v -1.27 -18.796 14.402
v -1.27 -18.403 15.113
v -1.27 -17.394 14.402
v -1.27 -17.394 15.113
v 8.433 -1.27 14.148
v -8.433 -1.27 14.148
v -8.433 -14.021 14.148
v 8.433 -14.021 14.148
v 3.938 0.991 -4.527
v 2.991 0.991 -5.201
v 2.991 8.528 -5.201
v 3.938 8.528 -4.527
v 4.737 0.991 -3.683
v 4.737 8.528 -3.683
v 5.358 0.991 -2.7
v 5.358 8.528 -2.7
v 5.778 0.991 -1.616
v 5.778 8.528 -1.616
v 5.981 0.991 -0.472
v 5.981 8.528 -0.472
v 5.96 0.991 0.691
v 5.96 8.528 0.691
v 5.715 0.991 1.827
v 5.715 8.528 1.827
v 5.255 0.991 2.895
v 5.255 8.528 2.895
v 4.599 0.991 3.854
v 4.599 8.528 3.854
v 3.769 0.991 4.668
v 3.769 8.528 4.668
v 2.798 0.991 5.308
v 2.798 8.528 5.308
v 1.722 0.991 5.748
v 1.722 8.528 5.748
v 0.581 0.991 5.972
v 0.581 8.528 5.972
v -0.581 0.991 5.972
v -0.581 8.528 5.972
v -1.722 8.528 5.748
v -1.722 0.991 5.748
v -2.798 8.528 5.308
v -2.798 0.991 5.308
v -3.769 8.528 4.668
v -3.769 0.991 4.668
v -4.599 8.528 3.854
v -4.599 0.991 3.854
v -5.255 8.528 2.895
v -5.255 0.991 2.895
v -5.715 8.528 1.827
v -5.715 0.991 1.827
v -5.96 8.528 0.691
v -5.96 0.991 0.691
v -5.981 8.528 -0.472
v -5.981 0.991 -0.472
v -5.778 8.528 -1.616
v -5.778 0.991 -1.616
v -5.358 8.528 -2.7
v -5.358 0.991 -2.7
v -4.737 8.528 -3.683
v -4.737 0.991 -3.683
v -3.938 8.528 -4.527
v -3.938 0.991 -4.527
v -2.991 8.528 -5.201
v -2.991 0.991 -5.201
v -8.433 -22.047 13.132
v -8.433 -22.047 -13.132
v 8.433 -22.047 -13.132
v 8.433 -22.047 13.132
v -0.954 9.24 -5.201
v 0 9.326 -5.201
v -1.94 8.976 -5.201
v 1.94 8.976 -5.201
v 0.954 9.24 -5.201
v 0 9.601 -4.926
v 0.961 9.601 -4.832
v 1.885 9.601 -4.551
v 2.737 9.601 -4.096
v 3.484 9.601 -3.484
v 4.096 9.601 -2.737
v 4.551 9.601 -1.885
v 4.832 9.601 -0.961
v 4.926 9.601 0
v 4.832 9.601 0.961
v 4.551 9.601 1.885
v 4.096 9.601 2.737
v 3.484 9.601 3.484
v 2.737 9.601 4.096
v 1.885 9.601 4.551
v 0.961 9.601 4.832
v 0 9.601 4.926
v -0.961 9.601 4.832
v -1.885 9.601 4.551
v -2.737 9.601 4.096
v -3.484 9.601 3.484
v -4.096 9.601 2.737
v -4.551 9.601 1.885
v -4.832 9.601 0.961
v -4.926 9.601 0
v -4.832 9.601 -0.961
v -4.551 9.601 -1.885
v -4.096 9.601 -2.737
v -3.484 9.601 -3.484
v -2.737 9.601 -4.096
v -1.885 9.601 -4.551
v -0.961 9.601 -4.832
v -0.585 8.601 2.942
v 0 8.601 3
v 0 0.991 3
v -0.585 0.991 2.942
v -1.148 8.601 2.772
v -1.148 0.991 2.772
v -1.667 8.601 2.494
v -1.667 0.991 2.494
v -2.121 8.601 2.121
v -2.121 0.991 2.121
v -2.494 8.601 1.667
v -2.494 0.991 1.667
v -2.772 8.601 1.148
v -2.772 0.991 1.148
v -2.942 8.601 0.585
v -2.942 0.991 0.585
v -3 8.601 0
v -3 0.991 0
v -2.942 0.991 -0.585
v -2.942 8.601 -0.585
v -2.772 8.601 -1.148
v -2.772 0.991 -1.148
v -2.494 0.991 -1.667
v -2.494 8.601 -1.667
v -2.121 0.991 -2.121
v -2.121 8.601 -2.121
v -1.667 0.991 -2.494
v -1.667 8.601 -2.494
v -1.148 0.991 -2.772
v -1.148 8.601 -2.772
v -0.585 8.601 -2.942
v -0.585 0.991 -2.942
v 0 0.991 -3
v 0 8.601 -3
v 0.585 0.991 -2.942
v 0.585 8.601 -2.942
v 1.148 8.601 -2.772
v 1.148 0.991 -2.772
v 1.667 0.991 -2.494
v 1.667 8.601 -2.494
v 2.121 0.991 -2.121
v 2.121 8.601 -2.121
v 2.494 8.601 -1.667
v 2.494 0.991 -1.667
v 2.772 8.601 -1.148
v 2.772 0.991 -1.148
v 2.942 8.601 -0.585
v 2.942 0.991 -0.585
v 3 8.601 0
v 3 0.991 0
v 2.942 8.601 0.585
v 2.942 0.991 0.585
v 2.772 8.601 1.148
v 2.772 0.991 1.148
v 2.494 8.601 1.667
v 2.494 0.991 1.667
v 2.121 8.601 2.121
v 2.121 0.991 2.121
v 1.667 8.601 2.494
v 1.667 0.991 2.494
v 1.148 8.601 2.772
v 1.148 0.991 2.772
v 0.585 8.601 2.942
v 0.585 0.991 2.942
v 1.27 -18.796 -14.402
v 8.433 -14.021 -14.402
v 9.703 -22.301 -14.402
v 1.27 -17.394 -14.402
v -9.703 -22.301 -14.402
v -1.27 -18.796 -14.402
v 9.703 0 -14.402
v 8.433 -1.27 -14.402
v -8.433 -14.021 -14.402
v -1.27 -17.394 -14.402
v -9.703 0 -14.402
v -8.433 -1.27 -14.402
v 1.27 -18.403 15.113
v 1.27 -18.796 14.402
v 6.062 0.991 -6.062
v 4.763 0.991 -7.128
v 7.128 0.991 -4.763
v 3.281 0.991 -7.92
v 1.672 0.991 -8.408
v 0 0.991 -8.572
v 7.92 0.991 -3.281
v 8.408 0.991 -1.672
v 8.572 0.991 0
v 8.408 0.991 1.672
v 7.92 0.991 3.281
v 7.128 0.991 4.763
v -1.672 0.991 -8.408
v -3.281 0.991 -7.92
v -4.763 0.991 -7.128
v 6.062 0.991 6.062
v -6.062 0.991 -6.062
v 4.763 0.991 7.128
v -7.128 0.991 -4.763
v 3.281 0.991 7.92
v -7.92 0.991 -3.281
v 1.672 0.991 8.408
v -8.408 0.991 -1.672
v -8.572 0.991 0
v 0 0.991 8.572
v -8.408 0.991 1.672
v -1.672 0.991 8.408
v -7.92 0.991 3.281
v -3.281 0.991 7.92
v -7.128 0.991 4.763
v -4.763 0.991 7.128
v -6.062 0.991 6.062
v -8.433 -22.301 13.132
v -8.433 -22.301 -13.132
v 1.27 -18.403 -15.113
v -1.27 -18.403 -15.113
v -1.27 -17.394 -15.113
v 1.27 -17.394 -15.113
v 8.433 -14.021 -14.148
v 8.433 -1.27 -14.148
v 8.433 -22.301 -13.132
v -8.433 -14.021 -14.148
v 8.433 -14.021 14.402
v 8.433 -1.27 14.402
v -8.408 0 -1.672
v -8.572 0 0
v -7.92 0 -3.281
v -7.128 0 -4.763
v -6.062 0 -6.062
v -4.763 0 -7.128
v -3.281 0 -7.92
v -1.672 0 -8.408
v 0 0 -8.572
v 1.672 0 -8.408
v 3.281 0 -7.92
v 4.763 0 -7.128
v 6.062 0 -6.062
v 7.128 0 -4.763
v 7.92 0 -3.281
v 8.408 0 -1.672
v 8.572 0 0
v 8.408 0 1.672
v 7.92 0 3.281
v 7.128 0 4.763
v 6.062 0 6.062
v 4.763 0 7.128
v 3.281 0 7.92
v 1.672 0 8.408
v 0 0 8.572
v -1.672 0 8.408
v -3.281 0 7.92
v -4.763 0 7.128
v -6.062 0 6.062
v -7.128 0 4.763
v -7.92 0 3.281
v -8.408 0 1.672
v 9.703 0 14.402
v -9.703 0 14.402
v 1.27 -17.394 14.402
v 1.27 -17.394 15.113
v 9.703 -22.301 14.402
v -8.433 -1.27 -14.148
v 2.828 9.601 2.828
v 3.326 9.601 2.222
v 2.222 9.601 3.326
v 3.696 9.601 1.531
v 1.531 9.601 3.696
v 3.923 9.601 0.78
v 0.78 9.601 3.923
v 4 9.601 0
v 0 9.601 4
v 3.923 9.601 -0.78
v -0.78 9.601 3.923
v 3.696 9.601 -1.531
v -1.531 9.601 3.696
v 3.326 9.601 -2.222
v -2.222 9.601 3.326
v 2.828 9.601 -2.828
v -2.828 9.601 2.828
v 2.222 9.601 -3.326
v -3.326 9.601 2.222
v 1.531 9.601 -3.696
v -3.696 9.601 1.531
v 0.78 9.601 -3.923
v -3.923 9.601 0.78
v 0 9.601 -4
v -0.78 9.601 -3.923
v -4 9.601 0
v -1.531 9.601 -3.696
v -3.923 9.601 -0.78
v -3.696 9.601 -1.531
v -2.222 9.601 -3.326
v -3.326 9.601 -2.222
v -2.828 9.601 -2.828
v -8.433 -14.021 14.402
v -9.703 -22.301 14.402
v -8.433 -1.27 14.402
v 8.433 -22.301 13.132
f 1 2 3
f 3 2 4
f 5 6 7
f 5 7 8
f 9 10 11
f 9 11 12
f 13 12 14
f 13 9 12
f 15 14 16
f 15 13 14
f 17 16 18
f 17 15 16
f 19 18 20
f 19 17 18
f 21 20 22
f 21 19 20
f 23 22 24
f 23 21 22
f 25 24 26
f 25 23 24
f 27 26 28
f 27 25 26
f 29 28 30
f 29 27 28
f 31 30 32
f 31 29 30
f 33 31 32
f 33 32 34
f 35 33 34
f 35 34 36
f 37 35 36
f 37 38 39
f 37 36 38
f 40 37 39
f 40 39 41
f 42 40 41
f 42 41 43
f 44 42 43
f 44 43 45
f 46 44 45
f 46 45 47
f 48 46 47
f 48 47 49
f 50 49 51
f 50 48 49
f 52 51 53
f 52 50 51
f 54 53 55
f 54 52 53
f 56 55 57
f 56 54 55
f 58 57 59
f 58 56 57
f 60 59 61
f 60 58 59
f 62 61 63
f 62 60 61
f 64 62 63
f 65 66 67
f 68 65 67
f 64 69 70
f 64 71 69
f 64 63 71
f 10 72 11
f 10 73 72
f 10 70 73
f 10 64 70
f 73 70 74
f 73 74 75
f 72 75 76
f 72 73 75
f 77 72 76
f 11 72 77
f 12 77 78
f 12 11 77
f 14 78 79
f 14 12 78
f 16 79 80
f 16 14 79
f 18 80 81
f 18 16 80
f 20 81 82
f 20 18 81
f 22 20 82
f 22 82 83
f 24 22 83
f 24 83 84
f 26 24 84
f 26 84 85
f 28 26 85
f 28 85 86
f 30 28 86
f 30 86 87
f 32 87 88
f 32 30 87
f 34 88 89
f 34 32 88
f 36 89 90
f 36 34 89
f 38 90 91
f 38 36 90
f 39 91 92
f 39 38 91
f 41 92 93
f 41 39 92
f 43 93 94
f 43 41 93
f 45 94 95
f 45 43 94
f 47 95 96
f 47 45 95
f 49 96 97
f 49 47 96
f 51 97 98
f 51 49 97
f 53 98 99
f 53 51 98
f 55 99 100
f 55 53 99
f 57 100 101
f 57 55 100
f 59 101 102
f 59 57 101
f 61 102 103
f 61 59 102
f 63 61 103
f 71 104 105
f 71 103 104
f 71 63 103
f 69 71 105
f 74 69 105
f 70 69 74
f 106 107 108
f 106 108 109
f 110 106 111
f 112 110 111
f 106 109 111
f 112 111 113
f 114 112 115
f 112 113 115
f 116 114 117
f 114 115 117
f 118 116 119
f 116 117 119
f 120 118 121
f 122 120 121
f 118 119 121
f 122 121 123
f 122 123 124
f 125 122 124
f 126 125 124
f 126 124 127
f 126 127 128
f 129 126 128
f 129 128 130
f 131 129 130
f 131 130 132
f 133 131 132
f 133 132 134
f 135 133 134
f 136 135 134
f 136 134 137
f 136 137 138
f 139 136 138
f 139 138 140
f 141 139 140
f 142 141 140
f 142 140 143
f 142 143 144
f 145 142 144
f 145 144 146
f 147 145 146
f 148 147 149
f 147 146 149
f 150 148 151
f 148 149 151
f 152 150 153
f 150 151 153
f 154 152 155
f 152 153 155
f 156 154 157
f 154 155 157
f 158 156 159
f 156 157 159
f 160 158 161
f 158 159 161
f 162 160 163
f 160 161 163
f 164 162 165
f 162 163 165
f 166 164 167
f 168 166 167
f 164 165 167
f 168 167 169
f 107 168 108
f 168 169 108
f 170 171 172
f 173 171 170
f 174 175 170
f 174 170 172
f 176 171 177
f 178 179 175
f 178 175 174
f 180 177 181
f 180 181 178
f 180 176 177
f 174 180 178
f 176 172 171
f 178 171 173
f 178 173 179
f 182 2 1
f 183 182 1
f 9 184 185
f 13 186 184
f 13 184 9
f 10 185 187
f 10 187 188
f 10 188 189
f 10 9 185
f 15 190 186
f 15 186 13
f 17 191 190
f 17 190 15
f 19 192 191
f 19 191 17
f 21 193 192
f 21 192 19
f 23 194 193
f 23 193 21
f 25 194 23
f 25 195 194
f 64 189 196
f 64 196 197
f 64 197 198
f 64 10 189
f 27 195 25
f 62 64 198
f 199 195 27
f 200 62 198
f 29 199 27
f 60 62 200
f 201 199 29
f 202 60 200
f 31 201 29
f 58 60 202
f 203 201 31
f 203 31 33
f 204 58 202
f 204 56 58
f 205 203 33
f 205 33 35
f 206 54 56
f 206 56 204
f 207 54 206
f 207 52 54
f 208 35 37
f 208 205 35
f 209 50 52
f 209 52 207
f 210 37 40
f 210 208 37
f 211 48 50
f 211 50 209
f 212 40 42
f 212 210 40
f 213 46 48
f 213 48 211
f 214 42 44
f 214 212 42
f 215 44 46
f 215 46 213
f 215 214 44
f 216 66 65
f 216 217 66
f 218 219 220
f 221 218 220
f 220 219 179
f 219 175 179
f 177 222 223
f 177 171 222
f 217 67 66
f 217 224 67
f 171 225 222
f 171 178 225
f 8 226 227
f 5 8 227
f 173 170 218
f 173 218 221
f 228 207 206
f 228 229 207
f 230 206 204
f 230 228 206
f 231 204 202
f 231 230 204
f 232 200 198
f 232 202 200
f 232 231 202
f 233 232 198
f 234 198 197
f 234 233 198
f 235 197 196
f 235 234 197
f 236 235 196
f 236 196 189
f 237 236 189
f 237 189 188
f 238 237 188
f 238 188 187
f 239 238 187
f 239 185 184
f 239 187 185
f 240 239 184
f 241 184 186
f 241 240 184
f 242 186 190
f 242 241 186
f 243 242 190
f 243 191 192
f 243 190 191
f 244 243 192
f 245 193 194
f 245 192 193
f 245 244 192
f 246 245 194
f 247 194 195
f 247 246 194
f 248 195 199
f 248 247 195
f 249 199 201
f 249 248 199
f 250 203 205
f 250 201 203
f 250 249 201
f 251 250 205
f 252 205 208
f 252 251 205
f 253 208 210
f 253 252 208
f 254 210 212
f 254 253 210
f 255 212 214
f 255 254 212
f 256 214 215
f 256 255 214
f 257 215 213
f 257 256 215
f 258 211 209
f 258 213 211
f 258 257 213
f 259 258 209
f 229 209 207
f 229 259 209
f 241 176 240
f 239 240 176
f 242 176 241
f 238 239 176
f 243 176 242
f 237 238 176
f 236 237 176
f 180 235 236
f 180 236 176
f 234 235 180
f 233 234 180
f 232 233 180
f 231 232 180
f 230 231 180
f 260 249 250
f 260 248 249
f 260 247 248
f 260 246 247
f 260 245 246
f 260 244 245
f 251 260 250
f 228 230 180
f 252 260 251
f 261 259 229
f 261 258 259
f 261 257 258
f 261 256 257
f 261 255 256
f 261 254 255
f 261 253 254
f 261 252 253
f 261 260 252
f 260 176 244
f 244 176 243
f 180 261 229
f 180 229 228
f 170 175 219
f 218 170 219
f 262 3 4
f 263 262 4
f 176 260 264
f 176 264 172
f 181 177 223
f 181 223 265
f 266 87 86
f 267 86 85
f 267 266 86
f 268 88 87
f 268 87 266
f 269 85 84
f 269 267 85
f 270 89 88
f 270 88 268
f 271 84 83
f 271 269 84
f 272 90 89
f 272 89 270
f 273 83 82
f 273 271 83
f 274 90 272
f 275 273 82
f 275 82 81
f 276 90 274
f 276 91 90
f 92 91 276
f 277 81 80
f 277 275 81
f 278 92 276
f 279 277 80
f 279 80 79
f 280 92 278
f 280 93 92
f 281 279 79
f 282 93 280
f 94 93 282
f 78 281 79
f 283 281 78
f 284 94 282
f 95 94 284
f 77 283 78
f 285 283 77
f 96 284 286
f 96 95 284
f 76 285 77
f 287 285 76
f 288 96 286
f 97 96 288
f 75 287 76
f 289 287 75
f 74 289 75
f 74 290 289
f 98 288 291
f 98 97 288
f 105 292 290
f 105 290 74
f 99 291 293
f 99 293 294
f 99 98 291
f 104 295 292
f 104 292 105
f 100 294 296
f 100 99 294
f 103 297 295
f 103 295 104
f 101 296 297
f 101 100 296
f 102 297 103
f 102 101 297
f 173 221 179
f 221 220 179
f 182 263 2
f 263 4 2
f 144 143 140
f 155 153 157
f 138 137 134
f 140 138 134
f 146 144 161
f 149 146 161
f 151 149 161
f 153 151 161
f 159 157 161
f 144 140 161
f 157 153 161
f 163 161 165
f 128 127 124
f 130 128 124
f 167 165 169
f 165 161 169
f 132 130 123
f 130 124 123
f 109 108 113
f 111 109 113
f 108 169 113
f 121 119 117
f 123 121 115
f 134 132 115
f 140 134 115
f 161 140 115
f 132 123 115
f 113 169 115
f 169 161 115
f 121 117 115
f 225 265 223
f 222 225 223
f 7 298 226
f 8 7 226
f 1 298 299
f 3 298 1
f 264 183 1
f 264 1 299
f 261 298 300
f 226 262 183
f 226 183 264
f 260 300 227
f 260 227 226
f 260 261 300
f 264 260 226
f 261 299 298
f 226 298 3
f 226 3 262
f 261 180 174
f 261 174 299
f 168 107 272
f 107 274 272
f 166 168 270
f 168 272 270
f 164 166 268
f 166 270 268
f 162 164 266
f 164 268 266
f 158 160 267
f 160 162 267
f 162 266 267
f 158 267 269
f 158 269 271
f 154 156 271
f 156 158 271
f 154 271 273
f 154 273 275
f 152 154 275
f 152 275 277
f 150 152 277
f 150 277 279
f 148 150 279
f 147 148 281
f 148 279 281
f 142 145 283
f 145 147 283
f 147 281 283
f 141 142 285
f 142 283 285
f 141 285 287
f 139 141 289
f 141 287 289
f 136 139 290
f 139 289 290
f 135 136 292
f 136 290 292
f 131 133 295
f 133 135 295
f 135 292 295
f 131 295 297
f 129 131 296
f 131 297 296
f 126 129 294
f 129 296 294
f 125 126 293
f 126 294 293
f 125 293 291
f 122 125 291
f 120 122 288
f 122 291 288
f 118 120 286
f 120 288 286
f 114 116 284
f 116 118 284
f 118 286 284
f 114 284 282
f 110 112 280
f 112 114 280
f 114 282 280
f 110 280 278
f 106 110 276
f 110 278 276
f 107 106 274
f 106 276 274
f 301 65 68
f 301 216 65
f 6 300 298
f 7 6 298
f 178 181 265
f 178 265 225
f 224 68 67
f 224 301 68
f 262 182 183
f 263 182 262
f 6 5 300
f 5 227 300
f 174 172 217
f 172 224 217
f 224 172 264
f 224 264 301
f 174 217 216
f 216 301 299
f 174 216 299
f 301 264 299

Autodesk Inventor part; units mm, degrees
sketch "Sketch_1" plane through (0, 0, 0) normal (0, 1, 0) x (-1, 0, 0)
  line L0 (9.7028, 14.4018) -> (-9.7028, 14.4018)
  line L1 (-9.7028, 14.4018) -> (-9.7028, -14.4018)
  line L2 (-9.7028, -14.4018) -> (9.7028, -14.4018)
  line L3 (9.7028, -14.4018) -> (9.7028, 14.4018)
extrude "Extrusion1" add sketch "Sketch_1" against normal blind 22.3012
sketch "Sketch_2" plane through (0, 0, 0) normal (0, 1, 0) x (-1, 0, 0)
  circle A0 centre (0, 0) radius 8.5725
extrude "Extrusion2" add sketch "Sketch_2" along normal blind 0.9906
sketch "Sketch_3" plane through (0, 0, 0) normal (1, 0, 0) x (0, 1, 0)
  line L0 (0.9906, 0) -> (9.6012, 0)
  line L1 (9.6012, 0) -> (9.6012, -4.9265)
  line L2 (9.6012, -4.9265) -> (8.5277, -6)
  line L3 (8.5277, -6) -> (0.9906, -6)
  line L4 (0.9906, -6) -> (0.9906, 0)
  line L5 (0.9906, 0) -> (9.6012, 0)
revolve "Revolution1" add sketch "Sketch_3" angle 360 about axis through (0, 0.9906, 0) along (0, 1, 0)
sketch "Sketch_10" plane through (0, 0.9906, 0) normal (0, 1, 0) x (1, 0, 0)
  line L0 (-2.9909, 5.2014) -> (2.9909, 5.2014)
  arc A0 (2.9909, 5.2014) -> (-2.9909, 5.2014) centre (0, 0) ccw
extrude "Extrusion3" cut sketch "Sketch_10" along normal blind 8.6106
sketch "Sketch5" plane through (0, 9.6012, 0) normal (0, 1, 0) x (1, 0, 0)
  point P0 (0, 0)
hole "Drilling 1" at (0, 9.6012, 0) direction (0, -1, 0) diameter 6 depth 8.6106 countersink diameter 8 countersink angle 90
sketch "Sketch_5" plane through (0, -22.3012, 0) normal (0, 1, 0) x (1, 0, 0)
  line L0 (-8.4328, -13.1318) -> (8.4328, -13.1318)
  line L1 (8.4328, -13.1318) -> (8.4328, 13.1318)
  line L2 (8.4328, 13.1318) -> (-8.4328, 13.1318)
  line L3 (-8.4328, 13.1318) -> (-8.4328, -13.1318)
extrude "Extrusion4" cut sketch "Sketch_5" along normal blind 0.254
sketch "Sketch_6" plane through (0, 0, -14.4018) normal (0, 0, 1) x (1, 0, 0)
  line L0 (-8.4328, -1.27) -> (-8.4328, -14.0208)
  line L1 (-8.4328, -14.0208) -> (8.4328, -14.0208)
  line L2 (8.4328, -14.0208) -> (8.4328, -1.27)
  line L3 (8.4328, -1.27) -> (-8.4328, -1.27)
extrude "Extrusion5" cut sketch "Sketch_6" along normal blind 0.254
sketch "Sketch_7" plane through (0, 0, 14.4018) normal (0, 0, 1) x (1, 0, 0)
  line L0 (-8.4328, -1.27) -> (-8.4328, -14.0208)
  line L1 (-8.4328, -14.0208) -> (8.4328, -14.0208)
  line L2 (8.4328, -14.0208) -> (8.4328, -1.27)
  line L3 (8.4328, -1.27) -> (-8.4328, -1.27)
extrude "Extrusion6" cut sketch "Sketch_7" against normal blind 0.254
sketch "Sketch_8" plane through (0, 0, 0) normal (1, 0, 0) x (0, 1, 0)
  line L0 (-17.3939, 15.113) -> (-18.4034, 15.113)
  line L1 (-18.4034, 15.113) -> (-18.796, 14.4018)
  line L2 (-18.796, 14.4018) -> (-17.3939, 14.4018)
  line L3 (-17.3939, 14.4018) -> (-17.3939, 15.113)
extrude "Extrusion7" add sketch "Sketch_8" along normal mid plane 2.54
sketch "Sketch_9" plane through (0, 0, 0) normal (1, 0, 0) x (0, 1, 0)
  line L0 (-17.3939, -14.4018) -> (-18.796, -14.4018)
  line L1 (-18.796, -14.4018) -> (-18.4034, -15.113)
  line L2 (-18.4034, -15.113) -> (-17.3939, -15.113)
  line L3 (-17.3939, -15.113) -> (-17.3939, -14.4018)
extrude "Extrusion8" add sketch "Sketch_9" along normal mid plane 2.54
ref_plane "body_to_body2_XY" through (0, -15.2908, 0) normal (0, -1, 0) x (1, 0, 0)
ref_plane "body_to_body2_YZ" through (0, -15.2908, 0) normal (1, 0, 0) x (0, 0, 1)
ref_plane "body_to_body2_ZX" through (0, -15.2908, 0) normal (0, 0, 1) x (0, -1, 0)
ref_plane "body_to_dummy_XY" through (0, 0, 0) normal (0, -1, 0) x (1, 0, 0)
ref_plane "body_to_dummy_YZ" through (0, 0, 0) normal (1, 0, 0) x (0, 0, 1)
ref_plane "body_to_dummy_ZX" through (0, 0, 0) normal (0, 0, 1) x (0, -1, 0)
ref_plane "body_to_terminal_XY" through (0, -22.3012, 0) normal (0, 1, 0) x (1, 0, 0)
ref_plane "body_to_terminal_YZ" through (0, -22.3012, 0) normal (1, 0, 0) x (0, 0, -1)
ref_plane "body_to_terminal_ZX" through (0, -22.3012, 0) normal (0, 0, -1) x (0, 1, 0)
ref_plane "body_to_toggle_XY" through (0, 2.4003, 0) normal (0, -1, 0) x (1, 0, 0)
ref_plane "body_to_toggle_YZ" through (0, 2.4003, 0) normal (1, 0, 0) x (0, 0, 1)
ref_plane "body_to_toggle_ZX" through (0, 2.4003, 0) normal (0, 0, 1) x (0, -1, 0)
ref_plane "body_to_washer_XY" through (0, 0.9906, 0) normal (0, -1, 0) x (1, 0, 0)
ref_plane "body_to_washer_YZ" through (0, 0.9906, 0) normal (1, 0, 0) x (0, 0, 1)
ref_plane "body_to_washer_ZX" through (0, 0.9906, 0) normal (0, 0, 1) x (0, -1, 0)
properties part number "WT_body"
